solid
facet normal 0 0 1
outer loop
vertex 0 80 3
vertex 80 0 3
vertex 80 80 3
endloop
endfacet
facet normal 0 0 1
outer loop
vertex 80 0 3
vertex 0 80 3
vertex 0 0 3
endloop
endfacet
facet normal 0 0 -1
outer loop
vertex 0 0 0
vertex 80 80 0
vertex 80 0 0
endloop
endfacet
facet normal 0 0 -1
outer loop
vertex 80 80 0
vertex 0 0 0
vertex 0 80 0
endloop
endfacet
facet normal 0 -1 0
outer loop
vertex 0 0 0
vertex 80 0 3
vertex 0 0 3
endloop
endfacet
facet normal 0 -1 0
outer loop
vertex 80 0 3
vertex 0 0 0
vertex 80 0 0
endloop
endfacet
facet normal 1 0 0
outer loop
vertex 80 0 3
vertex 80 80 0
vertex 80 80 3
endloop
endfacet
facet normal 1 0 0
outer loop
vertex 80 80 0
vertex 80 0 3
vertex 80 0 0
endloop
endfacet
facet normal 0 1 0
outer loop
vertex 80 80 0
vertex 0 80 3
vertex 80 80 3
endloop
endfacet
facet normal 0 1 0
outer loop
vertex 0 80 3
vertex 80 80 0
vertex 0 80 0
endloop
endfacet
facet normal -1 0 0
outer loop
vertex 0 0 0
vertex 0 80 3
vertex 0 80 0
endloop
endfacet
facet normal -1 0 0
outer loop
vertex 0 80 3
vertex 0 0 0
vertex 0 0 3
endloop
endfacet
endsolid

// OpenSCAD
/*
Title: Scaffold - Rolling Energy Transfer Demo
Folder: 13_rolling_motion
Physics Topic: Planned extension
Difficulty: Scaffold
Print Type: FDM
Teaches: Future concept module
Use Case: Planned classroom extension
*/

// --------------------
// Parameters
// --------------------
base_size = 80;
thickness = 3;

module scaffold_placeholder(){
    cube([base_size,base_size,thickness]);
}

// --------------------
// Physics Meaning
// --------------------
// Scaffold file with geometry placeholder and planned educational direction.

// --------------------
// Learning Notes
// --------------------
// TODO: add activity prompts and comparative parameter sweeps.

// --------------------
// Print Notes
// --------------------
// TODO: finalize orientation and durability tuning.

// --------------------
// Customization Ideas
// --------------------
// TODO: convert placeholder to fully featured model in roadmap sequence.

scaffold_placeholder();
